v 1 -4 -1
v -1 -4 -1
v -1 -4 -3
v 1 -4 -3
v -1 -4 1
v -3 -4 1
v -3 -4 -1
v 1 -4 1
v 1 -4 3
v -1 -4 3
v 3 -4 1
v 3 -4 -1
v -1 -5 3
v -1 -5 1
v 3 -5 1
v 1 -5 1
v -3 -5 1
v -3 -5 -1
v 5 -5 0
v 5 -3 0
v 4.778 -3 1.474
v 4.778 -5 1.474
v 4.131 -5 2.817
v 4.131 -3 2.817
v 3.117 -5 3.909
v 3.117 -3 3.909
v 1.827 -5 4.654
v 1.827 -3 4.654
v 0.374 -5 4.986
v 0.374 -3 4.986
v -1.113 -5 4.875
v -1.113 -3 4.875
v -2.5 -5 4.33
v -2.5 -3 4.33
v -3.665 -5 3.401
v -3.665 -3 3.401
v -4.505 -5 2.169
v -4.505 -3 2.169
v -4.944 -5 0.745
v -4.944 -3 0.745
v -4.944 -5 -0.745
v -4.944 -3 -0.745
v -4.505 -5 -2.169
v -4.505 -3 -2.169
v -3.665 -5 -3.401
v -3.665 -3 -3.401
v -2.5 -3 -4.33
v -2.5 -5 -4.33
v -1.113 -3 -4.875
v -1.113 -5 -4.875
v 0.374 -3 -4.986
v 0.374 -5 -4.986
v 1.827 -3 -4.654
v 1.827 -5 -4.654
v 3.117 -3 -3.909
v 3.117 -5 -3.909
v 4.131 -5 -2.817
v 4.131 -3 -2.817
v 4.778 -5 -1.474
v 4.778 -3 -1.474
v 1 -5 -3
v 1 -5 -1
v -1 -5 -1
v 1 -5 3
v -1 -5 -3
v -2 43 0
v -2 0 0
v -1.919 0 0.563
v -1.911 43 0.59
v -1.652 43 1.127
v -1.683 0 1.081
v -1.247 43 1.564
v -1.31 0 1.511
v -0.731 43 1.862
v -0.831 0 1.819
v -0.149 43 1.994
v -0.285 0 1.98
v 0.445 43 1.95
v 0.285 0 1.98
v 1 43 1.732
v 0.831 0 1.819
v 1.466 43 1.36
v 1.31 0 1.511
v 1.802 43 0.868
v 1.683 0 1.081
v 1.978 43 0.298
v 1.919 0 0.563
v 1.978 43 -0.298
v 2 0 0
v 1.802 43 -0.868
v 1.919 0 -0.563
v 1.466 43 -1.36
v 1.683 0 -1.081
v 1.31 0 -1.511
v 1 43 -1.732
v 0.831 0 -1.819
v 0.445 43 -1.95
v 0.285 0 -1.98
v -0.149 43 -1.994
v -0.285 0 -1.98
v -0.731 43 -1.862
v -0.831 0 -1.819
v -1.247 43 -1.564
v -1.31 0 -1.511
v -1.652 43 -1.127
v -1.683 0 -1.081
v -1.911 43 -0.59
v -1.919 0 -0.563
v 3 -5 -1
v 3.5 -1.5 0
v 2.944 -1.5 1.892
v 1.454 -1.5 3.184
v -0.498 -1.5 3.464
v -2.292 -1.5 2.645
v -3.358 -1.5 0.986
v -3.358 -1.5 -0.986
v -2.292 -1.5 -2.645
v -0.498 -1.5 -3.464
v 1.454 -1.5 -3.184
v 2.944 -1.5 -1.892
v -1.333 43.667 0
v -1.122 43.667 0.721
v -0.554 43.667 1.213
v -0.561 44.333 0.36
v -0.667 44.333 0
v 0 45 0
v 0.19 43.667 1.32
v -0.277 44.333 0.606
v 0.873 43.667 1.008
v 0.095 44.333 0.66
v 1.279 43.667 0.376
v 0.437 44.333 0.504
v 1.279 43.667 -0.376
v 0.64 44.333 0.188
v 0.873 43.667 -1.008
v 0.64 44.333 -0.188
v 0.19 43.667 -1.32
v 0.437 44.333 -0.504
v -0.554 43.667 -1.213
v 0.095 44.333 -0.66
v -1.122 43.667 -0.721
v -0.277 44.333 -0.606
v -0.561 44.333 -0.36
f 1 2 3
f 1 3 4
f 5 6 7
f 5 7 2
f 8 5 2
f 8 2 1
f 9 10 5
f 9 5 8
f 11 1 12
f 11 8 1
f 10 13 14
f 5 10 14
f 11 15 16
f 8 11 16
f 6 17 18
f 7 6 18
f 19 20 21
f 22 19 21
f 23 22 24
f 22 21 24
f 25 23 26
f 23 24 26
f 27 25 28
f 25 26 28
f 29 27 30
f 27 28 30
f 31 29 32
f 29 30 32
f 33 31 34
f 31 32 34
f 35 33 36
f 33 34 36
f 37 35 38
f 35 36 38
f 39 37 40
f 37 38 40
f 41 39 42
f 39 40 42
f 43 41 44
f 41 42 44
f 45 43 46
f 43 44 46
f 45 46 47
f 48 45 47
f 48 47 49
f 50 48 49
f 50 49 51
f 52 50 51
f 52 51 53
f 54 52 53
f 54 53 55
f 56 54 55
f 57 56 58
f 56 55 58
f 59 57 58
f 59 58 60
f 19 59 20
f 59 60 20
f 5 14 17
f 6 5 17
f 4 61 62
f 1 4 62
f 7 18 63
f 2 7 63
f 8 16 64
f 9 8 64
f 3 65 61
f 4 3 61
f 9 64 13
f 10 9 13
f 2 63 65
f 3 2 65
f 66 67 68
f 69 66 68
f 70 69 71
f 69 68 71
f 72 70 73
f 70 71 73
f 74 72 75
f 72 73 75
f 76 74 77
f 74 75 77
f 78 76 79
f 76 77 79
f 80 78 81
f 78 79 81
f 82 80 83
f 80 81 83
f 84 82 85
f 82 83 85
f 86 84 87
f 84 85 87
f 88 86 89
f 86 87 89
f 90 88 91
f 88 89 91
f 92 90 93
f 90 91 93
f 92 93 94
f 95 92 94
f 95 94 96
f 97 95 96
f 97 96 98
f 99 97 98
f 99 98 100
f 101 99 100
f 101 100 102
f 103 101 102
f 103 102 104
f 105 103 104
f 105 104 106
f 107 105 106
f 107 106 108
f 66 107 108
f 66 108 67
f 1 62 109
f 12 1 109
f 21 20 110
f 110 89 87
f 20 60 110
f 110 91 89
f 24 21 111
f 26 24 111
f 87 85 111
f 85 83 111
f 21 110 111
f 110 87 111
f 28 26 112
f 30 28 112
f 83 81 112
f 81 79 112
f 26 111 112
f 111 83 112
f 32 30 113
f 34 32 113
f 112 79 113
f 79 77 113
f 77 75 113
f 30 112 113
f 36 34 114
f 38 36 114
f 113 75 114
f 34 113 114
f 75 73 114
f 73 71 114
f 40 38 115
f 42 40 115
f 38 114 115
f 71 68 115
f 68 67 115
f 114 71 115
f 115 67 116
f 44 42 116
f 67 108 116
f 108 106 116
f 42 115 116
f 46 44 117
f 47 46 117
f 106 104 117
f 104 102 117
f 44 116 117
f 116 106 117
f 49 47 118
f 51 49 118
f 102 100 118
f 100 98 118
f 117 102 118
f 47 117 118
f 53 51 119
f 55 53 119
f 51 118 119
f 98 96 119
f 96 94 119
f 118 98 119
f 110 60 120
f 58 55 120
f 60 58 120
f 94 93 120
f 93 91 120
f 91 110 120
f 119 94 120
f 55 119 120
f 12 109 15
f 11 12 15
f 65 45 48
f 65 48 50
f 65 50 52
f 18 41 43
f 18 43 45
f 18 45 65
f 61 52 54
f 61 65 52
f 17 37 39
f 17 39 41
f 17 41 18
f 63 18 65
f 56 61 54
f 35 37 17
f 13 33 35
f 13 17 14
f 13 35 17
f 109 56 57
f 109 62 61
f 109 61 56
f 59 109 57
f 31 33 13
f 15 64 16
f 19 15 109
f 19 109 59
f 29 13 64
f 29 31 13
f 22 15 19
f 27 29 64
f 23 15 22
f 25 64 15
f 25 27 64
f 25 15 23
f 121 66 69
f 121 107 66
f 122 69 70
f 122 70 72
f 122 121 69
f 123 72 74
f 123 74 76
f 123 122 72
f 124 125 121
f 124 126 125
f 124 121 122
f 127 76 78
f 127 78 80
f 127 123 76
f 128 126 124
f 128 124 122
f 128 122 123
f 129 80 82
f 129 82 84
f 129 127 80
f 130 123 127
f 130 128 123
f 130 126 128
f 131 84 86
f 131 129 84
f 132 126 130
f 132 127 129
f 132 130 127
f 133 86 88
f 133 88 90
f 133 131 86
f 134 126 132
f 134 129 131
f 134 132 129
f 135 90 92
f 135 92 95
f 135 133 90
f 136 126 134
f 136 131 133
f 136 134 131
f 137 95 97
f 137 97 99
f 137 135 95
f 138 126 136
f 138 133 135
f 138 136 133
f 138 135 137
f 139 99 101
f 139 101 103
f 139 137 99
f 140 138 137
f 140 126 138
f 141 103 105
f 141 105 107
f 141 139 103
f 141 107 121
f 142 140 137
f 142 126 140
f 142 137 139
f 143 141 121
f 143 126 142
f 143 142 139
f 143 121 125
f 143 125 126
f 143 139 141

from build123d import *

# Parameters (mm, degrees)
F0_R     = 5
F1_DEPTH = 5
F2_SIZE  = 3
F3_R     = 2
F4_DEPTH = 45
F5_SIZE  = 2
F7_DEPTH = 1


with BuildPart() as f1:
    # F0 (on Front) → F1 (new body)
    with BuildSketch(Plane.XZ):
        Circle(F0_R)
    extrude(amount=F1_DEPTH)

    # F2
    f2_edges = [f1.edges().sort_by_distance(p)[0] for p in [
        (-5, 0, 0),
    ]]
    chamfer(f2_edges, length=F2_SIZE)

    # F3 (on face) → F4 (join)
    with BuildSketch(Plane(origin=(0, 0, 0), x_dir=(-1, 0, 0), z_dir=(0, 1, 0))):
        Circle(F3_R)
    extrude(amount=F4_DEPTH)

    # F5
    f5_edges = [f1.edges().sort_by_distance(p)[0] for p in [
        (2, 45, 0),
    ]]
    chamfer(f5_edges, length=F5_SIZE)

    # F6 (on face) → F7 (cut)
    with BuildSketch(Plane.XZ.offset(5)):
        Polygon((1, 3), (-1, 3), (-1, 1), (-3, 1), (-3, -1), (-1, -1), (-1, -3), (1, -3), (1, -1), (3, -1), (3, 1), (1, 1), align=None)
    extrude(amount=-F7_DEPTH, mode=Mode.SUBTRACT)


solid = f1.part
